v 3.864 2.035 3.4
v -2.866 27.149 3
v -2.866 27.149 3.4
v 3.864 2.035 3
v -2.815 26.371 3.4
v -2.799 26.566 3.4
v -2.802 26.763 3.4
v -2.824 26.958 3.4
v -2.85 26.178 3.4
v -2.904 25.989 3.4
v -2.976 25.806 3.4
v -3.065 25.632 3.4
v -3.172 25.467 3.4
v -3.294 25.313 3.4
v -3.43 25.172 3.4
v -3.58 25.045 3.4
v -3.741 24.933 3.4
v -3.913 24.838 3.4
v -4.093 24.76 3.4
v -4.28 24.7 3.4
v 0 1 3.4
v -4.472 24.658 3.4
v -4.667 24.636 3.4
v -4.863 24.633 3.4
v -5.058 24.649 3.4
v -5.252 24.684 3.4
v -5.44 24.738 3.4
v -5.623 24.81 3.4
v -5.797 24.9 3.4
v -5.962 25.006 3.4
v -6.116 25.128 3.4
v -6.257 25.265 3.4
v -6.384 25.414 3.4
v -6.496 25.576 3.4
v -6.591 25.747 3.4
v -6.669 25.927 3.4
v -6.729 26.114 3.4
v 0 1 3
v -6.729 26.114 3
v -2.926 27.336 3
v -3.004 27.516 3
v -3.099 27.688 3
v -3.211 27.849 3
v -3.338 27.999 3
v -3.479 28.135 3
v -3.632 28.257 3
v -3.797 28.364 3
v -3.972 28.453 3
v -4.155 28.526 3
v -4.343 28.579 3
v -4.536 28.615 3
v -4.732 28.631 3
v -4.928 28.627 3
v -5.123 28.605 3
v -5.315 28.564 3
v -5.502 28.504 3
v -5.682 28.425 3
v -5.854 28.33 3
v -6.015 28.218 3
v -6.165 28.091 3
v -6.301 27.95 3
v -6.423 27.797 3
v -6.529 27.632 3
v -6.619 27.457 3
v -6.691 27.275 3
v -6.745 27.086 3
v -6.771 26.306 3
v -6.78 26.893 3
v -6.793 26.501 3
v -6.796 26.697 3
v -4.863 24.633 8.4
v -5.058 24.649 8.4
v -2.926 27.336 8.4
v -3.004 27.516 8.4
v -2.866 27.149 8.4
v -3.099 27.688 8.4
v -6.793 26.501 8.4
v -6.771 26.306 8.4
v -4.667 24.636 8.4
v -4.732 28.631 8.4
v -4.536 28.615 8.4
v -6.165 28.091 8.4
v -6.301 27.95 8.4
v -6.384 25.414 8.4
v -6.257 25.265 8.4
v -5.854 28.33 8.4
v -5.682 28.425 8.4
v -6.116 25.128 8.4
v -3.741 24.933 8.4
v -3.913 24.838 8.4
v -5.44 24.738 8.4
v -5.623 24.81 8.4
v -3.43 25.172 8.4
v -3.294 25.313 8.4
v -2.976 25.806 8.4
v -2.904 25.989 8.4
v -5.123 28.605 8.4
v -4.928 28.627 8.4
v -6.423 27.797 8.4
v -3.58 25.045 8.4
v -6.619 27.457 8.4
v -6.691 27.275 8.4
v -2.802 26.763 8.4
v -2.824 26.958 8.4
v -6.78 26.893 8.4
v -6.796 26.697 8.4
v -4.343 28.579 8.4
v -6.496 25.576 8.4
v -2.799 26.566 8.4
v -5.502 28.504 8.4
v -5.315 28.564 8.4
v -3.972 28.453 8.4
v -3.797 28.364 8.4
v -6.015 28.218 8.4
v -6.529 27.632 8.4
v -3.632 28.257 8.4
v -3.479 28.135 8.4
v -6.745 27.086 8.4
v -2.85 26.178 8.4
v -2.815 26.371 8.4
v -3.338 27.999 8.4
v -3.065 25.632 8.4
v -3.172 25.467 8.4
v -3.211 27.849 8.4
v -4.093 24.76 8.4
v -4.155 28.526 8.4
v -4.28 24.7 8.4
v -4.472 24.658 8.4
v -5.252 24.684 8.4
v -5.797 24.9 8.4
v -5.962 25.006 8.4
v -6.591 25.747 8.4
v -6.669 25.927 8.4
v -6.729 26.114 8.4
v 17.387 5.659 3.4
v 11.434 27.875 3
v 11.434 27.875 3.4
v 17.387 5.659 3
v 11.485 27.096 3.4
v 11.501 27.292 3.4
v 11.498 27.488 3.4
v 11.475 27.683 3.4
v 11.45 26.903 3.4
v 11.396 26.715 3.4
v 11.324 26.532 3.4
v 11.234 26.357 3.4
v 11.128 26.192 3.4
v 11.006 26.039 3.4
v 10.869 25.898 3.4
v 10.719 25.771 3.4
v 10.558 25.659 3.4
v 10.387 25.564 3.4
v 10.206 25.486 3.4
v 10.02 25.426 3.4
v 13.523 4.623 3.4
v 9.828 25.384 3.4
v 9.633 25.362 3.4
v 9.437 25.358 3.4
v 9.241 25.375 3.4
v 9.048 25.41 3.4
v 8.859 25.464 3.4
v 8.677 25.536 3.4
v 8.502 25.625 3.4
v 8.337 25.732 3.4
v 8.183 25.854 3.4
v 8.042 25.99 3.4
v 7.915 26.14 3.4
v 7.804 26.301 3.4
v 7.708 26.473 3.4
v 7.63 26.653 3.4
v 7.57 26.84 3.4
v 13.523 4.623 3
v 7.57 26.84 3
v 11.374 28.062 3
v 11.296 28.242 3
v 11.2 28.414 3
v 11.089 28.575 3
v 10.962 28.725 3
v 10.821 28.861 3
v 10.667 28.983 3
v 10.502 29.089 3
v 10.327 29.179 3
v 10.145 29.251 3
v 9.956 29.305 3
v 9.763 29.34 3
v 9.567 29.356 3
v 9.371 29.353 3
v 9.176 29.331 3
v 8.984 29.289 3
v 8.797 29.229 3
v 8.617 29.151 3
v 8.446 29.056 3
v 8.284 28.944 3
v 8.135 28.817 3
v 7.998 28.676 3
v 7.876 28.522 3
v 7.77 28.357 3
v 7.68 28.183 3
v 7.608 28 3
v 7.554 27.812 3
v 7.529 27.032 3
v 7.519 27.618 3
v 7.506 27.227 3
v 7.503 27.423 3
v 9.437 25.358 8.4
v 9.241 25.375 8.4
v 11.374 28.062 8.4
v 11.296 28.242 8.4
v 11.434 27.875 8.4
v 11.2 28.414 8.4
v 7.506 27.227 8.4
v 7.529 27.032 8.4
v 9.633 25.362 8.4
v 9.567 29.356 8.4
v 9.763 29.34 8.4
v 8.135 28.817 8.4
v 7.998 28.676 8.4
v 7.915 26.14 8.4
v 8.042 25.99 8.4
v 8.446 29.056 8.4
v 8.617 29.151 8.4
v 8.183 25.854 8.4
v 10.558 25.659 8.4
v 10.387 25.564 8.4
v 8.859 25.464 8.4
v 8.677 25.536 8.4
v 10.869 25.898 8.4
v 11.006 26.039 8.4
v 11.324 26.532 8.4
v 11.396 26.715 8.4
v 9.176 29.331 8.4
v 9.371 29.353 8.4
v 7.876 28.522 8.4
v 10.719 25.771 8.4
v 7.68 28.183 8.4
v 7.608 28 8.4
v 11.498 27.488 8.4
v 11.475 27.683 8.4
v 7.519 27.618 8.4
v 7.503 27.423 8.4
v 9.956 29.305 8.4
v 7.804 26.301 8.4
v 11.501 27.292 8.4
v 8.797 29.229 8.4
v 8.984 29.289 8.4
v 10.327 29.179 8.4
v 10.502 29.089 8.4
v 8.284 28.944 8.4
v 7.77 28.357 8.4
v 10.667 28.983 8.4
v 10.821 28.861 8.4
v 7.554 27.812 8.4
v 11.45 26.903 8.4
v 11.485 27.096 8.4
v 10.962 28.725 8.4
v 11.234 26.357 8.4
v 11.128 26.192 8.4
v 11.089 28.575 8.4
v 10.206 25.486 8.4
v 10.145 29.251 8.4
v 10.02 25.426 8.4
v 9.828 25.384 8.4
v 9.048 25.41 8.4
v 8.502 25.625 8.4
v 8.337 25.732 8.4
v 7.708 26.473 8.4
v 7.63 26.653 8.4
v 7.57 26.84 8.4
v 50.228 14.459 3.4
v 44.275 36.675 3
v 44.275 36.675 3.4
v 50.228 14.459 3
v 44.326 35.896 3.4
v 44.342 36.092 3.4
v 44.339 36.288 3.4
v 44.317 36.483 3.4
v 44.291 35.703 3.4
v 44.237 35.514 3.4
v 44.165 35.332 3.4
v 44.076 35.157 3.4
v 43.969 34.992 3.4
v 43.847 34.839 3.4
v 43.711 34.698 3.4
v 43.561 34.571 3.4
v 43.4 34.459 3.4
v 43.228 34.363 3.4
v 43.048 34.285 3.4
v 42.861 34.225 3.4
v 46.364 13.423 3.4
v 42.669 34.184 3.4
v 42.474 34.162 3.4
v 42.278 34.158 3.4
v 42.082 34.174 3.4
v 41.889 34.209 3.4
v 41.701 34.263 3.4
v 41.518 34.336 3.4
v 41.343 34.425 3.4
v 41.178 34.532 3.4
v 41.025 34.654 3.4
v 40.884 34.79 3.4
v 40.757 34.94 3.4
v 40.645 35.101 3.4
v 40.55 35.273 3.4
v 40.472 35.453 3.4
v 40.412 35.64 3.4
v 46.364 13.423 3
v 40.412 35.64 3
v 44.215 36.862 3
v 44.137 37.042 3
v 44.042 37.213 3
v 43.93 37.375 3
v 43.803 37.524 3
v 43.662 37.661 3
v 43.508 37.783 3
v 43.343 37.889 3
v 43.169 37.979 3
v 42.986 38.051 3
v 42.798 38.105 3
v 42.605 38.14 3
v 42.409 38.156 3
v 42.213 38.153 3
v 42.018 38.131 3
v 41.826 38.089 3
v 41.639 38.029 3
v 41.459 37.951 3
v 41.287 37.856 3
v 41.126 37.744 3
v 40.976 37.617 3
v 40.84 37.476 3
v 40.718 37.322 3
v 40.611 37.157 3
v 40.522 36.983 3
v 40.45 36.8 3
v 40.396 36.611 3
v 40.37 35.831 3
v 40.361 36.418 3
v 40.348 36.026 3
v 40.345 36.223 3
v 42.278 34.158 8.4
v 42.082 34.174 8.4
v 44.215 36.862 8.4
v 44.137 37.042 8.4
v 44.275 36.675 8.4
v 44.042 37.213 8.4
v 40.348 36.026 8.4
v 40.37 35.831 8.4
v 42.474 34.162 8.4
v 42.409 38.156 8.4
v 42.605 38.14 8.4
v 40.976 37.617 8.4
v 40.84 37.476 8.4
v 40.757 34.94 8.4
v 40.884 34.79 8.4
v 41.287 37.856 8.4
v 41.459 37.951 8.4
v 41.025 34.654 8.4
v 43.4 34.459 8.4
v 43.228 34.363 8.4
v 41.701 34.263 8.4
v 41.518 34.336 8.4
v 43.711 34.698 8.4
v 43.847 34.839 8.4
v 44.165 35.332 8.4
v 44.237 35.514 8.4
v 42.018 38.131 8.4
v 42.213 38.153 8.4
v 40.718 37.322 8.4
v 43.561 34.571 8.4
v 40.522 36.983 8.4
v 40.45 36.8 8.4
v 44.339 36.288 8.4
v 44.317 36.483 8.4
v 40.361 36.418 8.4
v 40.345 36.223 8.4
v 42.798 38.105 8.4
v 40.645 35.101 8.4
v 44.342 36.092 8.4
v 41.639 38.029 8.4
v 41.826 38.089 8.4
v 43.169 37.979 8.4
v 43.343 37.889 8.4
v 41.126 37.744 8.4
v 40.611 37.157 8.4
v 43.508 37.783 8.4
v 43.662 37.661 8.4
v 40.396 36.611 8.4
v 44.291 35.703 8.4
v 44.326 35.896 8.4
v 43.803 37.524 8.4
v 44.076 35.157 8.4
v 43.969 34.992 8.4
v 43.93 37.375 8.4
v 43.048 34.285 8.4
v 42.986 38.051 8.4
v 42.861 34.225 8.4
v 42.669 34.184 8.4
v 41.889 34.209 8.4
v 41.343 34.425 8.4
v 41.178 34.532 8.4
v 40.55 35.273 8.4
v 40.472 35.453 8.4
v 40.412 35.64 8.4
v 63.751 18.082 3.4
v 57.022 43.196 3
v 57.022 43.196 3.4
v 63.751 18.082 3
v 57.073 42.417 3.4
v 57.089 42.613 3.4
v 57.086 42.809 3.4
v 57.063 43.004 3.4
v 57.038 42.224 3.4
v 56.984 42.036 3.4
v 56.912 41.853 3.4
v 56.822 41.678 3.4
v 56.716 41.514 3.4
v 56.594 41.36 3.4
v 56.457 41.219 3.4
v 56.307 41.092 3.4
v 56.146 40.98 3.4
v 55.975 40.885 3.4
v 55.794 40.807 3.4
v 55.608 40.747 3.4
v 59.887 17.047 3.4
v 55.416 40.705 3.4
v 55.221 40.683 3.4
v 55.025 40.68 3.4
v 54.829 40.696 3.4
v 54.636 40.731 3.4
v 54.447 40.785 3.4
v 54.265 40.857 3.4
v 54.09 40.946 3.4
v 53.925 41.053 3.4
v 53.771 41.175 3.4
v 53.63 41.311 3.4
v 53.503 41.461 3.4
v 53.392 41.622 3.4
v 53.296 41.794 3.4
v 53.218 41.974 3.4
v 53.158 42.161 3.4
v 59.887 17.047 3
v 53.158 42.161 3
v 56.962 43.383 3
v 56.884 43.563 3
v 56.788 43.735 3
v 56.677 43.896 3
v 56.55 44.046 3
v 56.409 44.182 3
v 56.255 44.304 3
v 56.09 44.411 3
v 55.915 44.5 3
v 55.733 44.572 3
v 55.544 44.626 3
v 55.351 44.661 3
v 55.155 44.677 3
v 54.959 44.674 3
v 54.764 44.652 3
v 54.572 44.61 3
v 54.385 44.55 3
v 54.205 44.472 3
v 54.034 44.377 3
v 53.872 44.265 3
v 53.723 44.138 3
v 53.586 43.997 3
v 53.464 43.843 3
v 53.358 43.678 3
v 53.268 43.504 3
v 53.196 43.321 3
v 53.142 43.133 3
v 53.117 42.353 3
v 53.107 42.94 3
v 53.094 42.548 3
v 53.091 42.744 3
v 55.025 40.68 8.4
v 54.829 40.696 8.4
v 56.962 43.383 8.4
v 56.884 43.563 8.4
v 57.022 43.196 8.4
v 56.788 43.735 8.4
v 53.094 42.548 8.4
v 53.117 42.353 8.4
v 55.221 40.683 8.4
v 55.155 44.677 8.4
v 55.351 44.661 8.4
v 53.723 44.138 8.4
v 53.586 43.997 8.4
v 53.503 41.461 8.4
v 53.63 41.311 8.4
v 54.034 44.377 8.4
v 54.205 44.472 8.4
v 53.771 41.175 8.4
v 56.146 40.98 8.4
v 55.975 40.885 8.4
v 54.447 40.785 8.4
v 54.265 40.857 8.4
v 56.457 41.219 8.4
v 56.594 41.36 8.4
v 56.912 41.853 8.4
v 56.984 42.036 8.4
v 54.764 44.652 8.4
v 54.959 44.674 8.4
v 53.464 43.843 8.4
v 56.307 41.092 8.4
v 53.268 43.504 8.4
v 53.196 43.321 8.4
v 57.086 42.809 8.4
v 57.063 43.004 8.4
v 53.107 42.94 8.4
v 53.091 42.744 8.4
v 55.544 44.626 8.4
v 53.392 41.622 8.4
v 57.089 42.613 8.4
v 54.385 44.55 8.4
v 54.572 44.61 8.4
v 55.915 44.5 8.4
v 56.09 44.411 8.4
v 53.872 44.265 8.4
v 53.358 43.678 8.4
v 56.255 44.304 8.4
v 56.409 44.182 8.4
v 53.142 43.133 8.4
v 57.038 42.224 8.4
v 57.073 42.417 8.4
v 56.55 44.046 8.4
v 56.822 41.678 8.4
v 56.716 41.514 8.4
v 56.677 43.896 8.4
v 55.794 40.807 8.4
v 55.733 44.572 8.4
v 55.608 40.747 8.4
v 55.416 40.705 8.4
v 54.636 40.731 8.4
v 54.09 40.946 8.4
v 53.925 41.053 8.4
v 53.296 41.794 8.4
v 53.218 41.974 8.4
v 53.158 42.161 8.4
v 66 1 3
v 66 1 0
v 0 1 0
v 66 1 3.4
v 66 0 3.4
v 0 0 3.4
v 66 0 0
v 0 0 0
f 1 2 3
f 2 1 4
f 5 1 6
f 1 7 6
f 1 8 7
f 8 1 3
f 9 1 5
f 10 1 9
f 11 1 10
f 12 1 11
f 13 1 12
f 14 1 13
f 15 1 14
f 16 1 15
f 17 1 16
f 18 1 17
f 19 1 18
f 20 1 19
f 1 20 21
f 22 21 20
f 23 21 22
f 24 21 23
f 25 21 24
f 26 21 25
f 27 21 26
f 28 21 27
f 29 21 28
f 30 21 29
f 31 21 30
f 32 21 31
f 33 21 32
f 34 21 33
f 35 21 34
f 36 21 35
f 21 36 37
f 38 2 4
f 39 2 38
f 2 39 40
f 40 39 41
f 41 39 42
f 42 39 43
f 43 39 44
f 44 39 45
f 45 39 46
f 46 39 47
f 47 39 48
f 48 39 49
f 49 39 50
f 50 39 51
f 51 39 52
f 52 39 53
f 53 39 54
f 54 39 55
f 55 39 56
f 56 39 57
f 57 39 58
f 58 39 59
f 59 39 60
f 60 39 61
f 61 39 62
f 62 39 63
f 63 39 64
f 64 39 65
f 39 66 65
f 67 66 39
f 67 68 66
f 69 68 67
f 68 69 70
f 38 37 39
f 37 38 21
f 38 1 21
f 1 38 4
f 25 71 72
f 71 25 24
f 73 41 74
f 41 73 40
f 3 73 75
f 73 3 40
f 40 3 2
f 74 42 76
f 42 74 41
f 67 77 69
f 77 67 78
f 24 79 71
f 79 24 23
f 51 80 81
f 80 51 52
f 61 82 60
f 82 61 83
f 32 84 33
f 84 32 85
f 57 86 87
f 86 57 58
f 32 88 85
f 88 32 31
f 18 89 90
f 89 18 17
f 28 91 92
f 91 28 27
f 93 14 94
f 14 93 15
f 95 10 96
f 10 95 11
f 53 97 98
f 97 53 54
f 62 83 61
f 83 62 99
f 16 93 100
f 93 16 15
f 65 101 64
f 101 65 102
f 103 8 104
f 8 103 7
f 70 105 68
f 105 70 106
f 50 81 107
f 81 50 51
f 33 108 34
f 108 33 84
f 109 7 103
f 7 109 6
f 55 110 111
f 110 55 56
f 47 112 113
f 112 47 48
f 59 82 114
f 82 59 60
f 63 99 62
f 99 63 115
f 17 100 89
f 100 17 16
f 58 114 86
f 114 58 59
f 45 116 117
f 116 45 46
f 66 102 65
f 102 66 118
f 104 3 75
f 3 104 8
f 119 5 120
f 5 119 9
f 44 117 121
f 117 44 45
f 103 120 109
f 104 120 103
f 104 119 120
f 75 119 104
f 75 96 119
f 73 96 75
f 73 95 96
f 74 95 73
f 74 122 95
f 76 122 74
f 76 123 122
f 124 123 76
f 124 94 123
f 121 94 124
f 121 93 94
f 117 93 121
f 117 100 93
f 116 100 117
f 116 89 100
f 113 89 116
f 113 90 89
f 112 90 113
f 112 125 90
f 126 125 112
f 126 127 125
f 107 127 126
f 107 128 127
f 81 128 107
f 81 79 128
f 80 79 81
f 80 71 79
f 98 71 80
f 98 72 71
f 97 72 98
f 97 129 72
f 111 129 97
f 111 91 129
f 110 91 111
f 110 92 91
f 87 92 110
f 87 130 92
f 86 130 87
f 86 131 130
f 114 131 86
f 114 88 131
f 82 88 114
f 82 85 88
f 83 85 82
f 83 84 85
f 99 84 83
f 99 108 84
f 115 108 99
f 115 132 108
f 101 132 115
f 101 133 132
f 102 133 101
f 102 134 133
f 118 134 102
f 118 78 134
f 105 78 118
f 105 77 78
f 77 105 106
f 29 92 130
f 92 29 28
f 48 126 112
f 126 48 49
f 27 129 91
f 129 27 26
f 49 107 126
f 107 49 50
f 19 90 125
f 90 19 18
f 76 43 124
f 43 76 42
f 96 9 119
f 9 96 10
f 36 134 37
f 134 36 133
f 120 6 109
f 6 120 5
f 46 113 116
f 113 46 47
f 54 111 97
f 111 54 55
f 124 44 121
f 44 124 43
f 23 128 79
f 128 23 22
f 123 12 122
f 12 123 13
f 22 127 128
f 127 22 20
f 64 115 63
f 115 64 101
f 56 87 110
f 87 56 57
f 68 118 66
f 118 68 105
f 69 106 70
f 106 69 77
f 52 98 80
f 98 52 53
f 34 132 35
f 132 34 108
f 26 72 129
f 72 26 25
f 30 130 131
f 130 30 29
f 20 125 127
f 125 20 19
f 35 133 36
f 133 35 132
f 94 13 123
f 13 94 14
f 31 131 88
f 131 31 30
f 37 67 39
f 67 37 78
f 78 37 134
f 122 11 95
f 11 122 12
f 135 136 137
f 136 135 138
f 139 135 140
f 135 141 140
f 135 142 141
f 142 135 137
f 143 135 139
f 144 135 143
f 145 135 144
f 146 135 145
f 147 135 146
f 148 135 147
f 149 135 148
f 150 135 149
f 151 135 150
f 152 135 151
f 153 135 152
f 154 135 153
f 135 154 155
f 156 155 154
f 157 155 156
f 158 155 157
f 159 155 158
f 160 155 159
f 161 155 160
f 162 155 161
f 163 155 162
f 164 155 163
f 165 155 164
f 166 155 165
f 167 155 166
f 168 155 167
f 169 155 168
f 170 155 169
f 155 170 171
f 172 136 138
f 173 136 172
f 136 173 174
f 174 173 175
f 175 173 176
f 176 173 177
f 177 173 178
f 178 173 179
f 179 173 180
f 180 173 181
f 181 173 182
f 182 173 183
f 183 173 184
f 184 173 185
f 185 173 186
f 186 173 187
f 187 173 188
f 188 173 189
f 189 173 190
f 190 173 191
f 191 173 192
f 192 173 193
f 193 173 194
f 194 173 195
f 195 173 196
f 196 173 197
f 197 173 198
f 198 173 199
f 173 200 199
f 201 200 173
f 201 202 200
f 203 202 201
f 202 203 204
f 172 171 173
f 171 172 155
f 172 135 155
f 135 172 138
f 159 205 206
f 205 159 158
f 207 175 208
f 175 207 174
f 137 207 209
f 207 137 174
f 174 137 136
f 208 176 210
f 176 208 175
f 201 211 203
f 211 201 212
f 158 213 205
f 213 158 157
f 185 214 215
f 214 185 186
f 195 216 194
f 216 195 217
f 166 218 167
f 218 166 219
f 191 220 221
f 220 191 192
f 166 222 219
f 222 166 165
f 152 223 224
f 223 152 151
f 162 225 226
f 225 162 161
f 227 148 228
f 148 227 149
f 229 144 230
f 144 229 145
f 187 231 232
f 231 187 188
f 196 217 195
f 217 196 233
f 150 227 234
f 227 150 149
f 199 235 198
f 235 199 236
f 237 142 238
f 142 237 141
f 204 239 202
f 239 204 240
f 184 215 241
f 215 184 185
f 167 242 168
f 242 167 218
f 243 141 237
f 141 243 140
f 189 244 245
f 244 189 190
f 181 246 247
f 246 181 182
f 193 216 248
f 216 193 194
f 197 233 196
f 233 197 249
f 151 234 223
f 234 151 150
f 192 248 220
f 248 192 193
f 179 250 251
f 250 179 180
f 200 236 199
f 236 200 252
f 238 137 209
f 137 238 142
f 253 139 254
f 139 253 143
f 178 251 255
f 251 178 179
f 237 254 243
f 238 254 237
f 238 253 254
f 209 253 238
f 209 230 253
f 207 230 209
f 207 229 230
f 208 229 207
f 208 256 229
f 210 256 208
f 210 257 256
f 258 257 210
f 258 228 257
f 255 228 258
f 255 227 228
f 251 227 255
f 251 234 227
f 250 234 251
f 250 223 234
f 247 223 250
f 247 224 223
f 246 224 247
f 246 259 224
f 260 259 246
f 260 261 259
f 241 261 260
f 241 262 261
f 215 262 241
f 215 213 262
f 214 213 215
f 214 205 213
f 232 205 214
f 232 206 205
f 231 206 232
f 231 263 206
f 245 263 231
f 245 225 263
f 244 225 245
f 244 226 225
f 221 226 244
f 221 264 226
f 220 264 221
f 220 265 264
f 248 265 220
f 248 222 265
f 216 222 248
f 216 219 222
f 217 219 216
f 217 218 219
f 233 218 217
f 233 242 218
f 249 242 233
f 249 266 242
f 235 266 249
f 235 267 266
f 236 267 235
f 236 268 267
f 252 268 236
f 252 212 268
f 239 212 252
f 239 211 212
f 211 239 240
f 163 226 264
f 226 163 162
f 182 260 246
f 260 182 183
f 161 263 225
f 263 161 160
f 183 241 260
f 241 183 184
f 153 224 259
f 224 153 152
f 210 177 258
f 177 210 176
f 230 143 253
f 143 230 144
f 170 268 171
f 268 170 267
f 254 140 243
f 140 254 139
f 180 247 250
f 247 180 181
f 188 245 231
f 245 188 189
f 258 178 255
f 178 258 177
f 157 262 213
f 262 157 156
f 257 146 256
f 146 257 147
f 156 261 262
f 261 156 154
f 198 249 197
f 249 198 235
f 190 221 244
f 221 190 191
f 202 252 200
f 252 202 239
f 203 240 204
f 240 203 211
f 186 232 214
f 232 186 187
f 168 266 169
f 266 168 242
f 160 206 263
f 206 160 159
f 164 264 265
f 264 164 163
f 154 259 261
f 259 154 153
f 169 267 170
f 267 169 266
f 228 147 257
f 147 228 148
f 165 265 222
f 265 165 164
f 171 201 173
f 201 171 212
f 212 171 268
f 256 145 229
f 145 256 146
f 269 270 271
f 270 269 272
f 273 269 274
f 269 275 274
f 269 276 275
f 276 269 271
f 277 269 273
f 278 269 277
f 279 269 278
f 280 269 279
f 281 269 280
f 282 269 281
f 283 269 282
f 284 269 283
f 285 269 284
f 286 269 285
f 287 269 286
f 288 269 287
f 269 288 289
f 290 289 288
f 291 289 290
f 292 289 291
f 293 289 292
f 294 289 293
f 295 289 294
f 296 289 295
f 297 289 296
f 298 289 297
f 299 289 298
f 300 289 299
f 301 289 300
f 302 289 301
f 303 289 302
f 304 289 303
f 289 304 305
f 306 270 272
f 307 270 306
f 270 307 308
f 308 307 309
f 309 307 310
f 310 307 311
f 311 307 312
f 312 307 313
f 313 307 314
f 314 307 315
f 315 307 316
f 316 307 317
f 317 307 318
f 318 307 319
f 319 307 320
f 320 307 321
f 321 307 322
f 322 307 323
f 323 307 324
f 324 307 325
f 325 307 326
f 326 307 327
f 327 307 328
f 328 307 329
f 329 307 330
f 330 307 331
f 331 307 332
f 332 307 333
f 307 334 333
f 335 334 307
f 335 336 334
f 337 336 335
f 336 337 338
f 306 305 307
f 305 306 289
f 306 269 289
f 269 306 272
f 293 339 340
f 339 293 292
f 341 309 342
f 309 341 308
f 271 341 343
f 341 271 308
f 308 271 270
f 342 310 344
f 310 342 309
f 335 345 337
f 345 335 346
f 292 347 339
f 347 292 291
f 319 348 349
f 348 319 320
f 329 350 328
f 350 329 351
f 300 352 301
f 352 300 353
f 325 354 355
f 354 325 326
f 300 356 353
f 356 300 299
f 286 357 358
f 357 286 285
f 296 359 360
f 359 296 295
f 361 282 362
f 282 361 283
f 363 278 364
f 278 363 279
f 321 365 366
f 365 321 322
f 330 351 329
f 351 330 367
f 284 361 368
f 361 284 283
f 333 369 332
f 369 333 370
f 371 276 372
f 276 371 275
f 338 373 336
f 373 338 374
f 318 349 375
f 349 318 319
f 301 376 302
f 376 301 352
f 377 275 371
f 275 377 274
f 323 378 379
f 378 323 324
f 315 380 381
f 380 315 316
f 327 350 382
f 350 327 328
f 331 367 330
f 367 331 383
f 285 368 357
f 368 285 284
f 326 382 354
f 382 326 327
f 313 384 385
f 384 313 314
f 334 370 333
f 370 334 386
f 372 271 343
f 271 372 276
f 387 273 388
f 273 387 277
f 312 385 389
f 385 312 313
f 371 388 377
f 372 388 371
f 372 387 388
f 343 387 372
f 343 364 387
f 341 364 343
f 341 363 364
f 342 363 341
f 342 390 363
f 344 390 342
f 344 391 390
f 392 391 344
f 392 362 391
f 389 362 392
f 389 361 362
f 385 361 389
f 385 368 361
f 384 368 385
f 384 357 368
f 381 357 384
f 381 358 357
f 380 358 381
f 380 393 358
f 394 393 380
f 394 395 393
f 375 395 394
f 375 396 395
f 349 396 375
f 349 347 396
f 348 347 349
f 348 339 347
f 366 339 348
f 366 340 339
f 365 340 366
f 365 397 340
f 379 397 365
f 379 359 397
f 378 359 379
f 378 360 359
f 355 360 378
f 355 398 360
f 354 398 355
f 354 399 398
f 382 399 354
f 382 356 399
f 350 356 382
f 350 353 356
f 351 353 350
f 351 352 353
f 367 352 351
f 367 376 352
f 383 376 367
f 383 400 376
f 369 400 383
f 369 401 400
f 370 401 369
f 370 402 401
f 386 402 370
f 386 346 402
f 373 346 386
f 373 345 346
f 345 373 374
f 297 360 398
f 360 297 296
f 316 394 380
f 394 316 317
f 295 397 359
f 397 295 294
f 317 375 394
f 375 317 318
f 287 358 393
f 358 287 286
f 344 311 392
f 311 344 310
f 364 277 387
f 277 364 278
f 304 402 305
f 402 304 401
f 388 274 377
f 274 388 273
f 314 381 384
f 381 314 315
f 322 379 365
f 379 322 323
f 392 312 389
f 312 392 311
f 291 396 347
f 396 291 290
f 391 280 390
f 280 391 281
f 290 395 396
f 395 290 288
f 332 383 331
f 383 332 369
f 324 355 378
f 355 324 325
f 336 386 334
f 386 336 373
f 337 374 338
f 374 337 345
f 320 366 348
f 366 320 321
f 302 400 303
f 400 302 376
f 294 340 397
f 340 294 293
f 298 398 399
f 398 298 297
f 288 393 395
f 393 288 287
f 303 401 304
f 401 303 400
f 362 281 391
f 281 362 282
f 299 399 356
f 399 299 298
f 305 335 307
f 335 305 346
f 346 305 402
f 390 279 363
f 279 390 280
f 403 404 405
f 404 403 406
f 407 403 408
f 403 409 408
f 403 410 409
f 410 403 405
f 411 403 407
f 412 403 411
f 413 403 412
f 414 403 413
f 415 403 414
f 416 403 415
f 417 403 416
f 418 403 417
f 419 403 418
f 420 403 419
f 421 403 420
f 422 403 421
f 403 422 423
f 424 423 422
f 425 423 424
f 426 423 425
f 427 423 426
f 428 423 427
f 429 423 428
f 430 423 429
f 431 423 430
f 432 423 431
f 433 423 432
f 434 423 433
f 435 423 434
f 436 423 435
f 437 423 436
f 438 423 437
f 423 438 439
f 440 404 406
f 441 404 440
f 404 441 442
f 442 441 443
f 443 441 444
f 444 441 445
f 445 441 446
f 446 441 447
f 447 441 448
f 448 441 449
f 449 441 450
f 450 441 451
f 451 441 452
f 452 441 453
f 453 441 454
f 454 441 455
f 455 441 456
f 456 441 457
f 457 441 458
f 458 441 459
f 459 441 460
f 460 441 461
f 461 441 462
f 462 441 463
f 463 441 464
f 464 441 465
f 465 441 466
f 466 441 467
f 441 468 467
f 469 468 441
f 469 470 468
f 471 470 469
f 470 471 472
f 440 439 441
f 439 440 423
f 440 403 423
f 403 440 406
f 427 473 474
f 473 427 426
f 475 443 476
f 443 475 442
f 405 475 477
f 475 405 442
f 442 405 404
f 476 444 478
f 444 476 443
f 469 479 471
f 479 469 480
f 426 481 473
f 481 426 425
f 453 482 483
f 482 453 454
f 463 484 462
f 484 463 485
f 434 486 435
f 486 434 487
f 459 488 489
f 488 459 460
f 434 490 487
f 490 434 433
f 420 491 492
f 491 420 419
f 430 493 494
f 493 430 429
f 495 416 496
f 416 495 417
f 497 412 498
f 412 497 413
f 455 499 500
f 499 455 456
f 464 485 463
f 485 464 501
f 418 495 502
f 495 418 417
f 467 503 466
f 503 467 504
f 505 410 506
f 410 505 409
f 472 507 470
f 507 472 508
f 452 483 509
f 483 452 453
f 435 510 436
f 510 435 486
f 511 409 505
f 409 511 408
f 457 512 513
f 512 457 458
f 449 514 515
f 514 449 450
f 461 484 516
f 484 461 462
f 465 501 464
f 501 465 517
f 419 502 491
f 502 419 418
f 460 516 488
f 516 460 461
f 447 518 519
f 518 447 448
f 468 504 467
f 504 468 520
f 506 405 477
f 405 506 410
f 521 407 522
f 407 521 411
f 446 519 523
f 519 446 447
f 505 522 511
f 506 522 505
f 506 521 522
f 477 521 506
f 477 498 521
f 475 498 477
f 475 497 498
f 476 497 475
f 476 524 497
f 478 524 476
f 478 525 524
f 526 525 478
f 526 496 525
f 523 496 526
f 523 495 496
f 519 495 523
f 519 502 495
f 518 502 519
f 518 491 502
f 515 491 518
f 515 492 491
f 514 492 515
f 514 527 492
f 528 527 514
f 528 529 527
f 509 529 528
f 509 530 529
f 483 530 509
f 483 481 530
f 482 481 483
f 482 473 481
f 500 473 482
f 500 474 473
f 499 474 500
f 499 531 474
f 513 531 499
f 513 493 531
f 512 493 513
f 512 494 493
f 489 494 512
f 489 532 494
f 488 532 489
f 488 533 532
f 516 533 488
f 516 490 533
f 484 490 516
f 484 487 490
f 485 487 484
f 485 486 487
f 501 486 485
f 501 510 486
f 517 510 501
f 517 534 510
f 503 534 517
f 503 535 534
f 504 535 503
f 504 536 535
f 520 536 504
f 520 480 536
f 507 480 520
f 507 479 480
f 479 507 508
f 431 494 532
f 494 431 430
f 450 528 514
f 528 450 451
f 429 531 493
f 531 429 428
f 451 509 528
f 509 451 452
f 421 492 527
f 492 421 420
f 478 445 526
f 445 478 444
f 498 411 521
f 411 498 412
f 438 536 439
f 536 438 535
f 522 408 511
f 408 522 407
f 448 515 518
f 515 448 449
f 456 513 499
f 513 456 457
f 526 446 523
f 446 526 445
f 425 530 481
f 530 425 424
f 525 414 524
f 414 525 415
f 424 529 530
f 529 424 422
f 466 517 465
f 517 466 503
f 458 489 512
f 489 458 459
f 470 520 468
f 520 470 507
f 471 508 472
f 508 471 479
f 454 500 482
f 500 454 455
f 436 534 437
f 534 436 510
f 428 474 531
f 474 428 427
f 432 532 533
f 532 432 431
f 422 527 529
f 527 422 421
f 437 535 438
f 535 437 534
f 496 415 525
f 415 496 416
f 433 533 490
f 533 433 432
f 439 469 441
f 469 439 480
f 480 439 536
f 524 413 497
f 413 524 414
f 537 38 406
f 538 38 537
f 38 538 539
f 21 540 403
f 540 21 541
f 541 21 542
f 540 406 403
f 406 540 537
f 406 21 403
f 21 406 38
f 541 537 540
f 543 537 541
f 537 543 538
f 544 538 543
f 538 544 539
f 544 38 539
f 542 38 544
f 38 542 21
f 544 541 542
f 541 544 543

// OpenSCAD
// file: sidepin.scad
module sidepin(
	screw_diameter,
	screw_depth,
	pin_depth,
	pin_length
){
	union() {
		cube([
			screw_diameter,
			pin_length,
			pin_depth
		]);

		translate([
			screw_diameter / 2,
			pin_length,
			0
		])
		cylinder(
			screw_depth + pin_depth,
			d1=screw_diameter,
			d2=screw_diameter
		);
	}
}
// file: sideholder.scad
include <sidepin.scad>

module sideholder(
	screw_diameter,
	screw_depth,
	pin_depth,
	overhang,
	pin_lengths,
	distances,
	tilt
)
{
	assert(len(pin_lengths) == len(distances), "Lengths and distances must be the same length");
	
	let(
		width=max(distances) - min(distances) + screw_diameter,
		left=min(distances)
	) {
	translate([
		0,
		overhang[1],
		overhang[0]
	])
	union (){
		for (i = [0 : len(distances) - 1])
			rotate([0, 0, tilt])
			translate([
				distances[i],
				0,
				0
			])
			sidepin(screw_diameter, screw_depth, pin_depth, pin_lengths[i]);
		
		translate([
			left,
			0,
			0
		])
		linear_extrude(height=pin_depth)
		polygon(points=[
			[0, 0],
			[width * cos(tilt), width * sin(tilt)],
			[width, 0]]
		);
	};

	translate([
		left,
		0,
		0
	])
	cube([
		width,
		overhang[1],
		overhang[0] + pin_depth
	]);
	};
};
// main file
include <sideholder.scad>

screw_diameter = 4;
screw_depth = 5;
pin_depth = 0.4;
pin_lengths = [26, 23, 23, 26];
distances = [0, 14, 48, 62];
overhang = [3, 1];
tilt = 15;

$fn = $preview ? 8 : 64;
sideholder(screw_diameter, screw_depth, pin_depth, overhang, pin_lengths, distances, tilt);
